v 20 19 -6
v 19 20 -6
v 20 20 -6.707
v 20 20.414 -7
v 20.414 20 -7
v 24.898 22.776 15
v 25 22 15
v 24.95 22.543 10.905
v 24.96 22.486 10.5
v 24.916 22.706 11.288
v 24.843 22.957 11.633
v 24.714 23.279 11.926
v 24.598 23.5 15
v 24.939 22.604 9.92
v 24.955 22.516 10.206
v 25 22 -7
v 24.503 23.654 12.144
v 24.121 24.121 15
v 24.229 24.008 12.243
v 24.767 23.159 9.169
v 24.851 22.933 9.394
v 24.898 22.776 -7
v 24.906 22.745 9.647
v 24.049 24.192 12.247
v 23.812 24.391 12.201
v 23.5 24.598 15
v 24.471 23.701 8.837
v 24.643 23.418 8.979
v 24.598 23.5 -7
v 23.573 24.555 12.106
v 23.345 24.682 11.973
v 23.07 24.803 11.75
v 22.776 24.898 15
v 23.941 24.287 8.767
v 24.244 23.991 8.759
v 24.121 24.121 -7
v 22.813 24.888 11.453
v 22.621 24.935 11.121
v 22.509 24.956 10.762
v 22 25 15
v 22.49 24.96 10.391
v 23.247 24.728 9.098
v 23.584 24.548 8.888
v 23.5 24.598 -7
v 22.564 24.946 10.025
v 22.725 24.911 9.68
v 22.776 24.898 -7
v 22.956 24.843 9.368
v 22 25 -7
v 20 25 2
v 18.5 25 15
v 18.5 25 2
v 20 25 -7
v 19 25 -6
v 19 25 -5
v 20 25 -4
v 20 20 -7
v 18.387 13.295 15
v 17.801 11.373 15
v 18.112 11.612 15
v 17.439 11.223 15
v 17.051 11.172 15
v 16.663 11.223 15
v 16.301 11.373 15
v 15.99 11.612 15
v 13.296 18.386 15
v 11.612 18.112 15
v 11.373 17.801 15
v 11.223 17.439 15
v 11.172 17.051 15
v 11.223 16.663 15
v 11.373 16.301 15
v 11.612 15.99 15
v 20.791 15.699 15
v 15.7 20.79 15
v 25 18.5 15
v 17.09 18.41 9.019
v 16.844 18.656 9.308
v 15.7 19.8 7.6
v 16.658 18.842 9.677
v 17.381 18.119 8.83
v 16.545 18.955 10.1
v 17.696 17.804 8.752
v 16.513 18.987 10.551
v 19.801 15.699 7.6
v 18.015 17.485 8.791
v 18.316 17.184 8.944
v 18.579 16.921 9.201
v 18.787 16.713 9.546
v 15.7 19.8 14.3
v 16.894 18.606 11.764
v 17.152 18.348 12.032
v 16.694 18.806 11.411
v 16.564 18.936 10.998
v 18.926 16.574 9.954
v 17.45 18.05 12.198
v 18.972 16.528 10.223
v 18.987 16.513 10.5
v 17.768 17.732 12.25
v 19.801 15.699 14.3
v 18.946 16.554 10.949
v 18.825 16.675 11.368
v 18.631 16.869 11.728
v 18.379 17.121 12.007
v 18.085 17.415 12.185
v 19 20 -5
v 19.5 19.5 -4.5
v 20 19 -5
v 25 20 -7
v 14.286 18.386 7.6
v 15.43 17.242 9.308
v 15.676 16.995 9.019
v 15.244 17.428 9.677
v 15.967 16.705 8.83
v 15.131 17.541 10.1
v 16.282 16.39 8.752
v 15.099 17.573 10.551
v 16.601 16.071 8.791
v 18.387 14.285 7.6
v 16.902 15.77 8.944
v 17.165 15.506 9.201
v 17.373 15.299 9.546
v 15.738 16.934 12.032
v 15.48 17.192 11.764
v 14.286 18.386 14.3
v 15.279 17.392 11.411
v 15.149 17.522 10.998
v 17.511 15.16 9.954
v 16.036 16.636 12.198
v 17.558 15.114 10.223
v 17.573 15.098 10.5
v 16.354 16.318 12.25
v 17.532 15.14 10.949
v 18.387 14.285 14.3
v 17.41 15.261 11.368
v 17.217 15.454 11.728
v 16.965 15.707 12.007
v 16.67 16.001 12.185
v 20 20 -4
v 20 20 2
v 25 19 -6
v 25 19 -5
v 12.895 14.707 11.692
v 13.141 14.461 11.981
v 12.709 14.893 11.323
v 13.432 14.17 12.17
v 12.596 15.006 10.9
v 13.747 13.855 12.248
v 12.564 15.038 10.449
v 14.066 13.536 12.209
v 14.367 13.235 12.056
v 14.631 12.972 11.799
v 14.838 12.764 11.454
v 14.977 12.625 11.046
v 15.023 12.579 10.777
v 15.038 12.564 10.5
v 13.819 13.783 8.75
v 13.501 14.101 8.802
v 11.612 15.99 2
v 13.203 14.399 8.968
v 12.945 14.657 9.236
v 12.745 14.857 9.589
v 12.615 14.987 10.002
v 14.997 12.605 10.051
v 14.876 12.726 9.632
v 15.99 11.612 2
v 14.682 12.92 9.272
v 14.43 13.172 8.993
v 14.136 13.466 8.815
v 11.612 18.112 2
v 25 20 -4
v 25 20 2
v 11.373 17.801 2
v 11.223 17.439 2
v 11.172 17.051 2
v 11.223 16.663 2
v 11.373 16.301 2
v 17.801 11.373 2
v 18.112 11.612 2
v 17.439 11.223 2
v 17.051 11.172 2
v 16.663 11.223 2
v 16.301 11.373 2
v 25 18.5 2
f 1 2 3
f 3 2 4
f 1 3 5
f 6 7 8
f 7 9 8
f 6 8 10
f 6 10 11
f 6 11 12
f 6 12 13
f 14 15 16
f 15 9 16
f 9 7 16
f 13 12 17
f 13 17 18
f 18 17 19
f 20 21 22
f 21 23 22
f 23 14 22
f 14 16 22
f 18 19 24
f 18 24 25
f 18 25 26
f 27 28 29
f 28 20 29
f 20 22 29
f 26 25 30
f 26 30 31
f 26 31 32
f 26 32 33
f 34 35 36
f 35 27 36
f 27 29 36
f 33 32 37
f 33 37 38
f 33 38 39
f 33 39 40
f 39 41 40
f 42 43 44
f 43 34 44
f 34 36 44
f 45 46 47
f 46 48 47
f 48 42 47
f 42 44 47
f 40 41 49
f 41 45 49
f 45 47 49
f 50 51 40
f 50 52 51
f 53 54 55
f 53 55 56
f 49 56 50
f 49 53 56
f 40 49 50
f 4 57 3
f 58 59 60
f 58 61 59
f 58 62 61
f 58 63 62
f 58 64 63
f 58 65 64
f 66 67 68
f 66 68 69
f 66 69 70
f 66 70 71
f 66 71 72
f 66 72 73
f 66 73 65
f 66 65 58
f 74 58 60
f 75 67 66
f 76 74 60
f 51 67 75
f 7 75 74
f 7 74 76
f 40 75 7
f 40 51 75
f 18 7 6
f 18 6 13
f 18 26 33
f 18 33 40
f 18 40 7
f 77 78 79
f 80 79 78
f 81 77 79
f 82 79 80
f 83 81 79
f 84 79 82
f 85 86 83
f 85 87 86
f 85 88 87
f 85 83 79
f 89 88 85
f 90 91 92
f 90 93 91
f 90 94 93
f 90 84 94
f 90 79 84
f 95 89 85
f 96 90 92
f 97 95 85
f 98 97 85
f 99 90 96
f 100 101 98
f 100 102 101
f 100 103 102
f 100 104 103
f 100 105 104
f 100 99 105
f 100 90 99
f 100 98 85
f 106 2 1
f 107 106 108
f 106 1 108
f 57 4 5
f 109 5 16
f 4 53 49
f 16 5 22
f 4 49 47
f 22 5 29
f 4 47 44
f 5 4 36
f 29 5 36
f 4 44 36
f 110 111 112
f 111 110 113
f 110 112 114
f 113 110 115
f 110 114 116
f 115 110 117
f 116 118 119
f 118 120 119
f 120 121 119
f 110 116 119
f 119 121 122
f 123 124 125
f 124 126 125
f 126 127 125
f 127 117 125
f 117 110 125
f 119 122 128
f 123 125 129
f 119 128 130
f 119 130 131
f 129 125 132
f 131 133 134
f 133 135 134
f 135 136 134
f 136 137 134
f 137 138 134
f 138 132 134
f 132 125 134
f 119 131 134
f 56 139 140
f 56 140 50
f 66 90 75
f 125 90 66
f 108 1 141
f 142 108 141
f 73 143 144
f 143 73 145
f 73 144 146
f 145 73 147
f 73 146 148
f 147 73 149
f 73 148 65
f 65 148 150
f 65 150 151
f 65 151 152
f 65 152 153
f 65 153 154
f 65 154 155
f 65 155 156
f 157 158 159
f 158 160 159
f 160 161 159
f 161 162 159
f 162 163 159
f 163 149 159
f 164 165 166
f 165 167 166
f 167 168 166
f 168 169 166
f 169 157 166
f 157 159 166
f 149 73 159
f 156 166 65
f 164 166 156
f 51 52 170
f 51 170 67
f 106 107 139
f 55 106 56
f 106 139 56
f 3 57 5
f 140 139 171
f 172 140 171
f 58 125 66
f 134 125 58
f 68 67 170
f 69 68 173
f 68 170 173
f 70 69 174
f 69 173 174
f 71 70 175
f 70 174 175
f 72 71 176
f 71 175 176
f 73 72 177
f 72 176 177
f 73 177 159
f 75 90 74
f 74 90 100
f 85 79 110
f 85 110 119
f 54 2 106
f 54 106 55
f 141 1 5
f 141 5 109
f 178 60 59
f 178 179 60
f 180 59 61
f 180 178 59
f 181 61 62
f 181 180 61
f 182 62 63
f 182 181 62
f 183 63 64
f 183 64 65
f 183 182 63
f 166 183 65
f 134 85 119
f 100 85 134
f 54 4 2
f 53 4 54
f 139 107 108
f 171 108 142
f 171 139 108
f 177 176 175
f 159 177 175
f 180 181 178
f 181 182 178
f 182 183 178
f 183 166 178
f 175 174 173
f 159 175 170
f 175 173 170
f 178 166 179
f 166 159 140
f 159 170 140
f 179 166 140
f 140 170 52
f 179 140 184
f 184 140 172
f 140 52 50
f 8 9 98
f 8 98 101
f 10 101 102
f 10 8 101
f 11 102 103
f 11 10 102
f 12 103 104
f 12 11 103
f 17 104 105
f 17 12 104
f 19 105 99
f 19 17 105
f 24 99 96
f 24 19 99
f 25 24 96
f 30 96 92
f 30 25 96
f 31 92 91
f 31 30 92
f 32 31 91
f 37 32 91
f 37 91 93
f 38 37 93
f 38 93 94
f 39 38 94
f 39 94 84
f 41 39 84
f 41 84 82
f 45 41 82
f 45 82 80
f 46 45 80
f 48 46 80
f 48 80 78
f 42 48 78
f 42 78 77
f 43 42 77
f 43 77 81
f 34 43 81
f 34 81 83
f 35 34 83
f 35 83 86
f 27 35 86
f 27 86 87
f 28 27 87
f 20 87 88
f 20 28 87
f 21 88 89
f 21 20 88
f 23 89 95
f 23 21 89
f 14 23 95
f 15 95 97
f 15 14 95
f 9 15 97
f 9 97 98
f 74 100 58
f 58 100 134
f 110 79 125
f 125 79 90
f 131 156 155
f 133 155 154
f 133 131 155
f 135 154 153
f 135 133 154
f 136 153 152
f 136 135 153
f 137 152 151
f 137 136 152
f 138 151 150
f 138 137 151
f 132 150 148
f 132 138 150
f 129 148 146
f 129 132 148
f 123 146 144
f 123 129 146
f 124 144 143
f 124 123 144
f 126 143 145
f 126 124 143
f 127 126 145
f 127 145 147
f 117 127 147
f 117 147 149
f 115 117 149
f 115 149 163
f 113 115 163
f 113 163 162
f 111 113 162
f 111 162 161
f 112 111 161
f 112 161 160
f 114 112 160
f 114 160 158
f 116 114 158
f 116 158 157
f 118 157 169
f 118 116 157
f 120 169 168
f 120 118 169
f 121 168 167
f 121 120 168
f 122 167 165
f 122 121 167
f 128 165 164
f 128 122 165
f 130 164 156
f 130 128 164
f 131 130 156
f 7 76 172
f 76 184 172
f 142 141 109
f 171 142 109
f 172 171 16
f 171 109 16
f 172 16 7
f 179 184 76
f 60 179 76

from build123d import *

# Parameters (mm, degrees)
BOX406004_W                 = 5.8
BOX406004_H                 = 14.8
BOX406004_DEPTH             = 2
BOX406004_ROLL_ANGLE        = 89.999938
BOX406004_PITCH_ANGLE       = -2.6e-05
BOX406004_PLACEMENT_ANGLE   = -45.000013
CYLINDER066_R               = 1.75
CYLINDER066_DEPTH           = 33
CYLINDER066_ROLL_ANGLE      = 90.000024
CYLINDER066_PITCH_ANGLE     = 1e-05
CYLINDER066_PLACEMENT_ANGLE = -45.000049
BOX404_W                    = 5
BOX404_H                    = 5
BOX404_DEPTH                = 14
BOX406007_W                 = 14
BOX406007_H                 = 10
BOX406007_DEPTH             = 14
BOX406007_PLACEMENT_ANGLE   = 45
BOX405_W                    = 15
BOX405_H                    = 15
BOX405_DEPTH                = 13
CHAMFER_SIZE                = 8.5
FILLET_R                    = 1.5
BOX406008009_W              = 6
BOX406008009_H              = 6
BOX406008009_DEPTH          = 3
CHAMFER029_SIZE             = 1
CHAMFER030_SIZE             = 1
CHAMFER033_SIZE             = 1
FILLET006_R                 = 3
CHAMFER034_SIZE             = 0.7


with BuildPart() as box406004:
    # Box406004 → Box406004 (new body)
    with BuildSketch(Plane.XY):
        with Locations((2.9, 7.4)):
            Rectangle(BOX406004_W, BOX406004_H)
    extrude(amount=BOX406004_DEPTH)


with BuildPart() as box406004_1:
    # Box406004 roll: moved
    add(box406004.part.rotate(Axis((0, 0, 0), (1, 0, 0)), BOX406004_ROLL_ANGLE))


with BuildPart() as box406004_2:
    # Box406004 pitch: moved
    add(box406004_1.part.rotate(Axis((0, 0, 0), (0, 1, 0)), BOX406004_PITCH_ANGLE))


with BuildPart() as box406004_3:
    # Box406004 placement: moved
    add(box406004_2.part.moved(Location((15.7, 19.8, 7.6))).rotate(Axis((15.7, 19.8, 7.6), (0, 0, 1)), BOX406004_PLACEMENT_ANGLE))


with BuildPart() as finger_cavity:
    # Cylinder066 → Cylinder066 (new body)
    with BuildSketch(Plane.XY):
        Circle(CYLINDER066_R)
    extrude(amount=CYLINDER066_DEPTH)


with BuildPart() as finger_cavity_1:
    # Cylinder066 roll: moved
    add(finger_cavity.part.rotate(Axis((0, 0, 0), (1, 0, 0)), CYLINDER066_ROLL_ANGLE))


with BuildPart() as finger_cavity_2:
    # Cylinder066 pitch: moved
    add(finger_cavity_1.part.rotate(Axis((0, 0, 0), (0, 1, 0)), CYLINDER066_PITCH_ANGLE))


with BuildPart() as finger_cavity_3:
    # Cylinder066 placement: moved
    add(finger_cavity_2.part.moved(Location((26.8701, 26.8701, 10.5))).rotate(Axis((26.8701, 26.8701, 10.5), (0, 0, 1)), CYLINDER066_PLACEMENT_ANGLE))

    # Fusion103077010: union Box406004
    add(box406004_3.part)


with BuildPart() as cube334:
    # Box404 → Box404 (new body)
    with BuildSketch(Plane(origin=(20, 20, -7), x_dir=(1, 0, 0), z_dir=(0, 0, 1))):
        with Locations((2.5, 2.5)):
            Rectangle(BOX404_W, BOX404_H)
    extrude(amount=BOX404_DEPTH)


with BuildPart() as cube338:
    # Box406007 → Box406007 (new body)
    with BuildSketch(Plane.XY):
        with Locations((7, 5)):
            Rectangle(BOX406007_W, BOX406007_H)
    extrude(amount=BOX406007_DEPTH)


with BuildPart() as cube338_1:
    # Box406007 placement: moved
    add(cube338.part.moved(Location((1.78, 11.68, 2))).rotate(Axis((1.78, 11.68, 2), (0, 0, -1)), BOX406007_PLACEMENT_ANGLE))


with BuildPart() as fillet_body:
    # Box405 → Box405 (new body)
    with BuildSketch(Plane(origin=(10, 10, 2), x_dir=(1, 0, 0), z_dir=(0, 0, 1))):
        with Locations((7.5, 7.5)):
            Rectangle(BOX405_W, BOX405_H)
    extrude(amount=BOX405_DEPTH)

    # Chamfer
    chamfer_edges = [fillet_body.edges().sort_by_distance(p)[0] for p in [
        (10, 25, 8.5),
        (25, 10, 8.5),
    ]]
    chamfer(chamfer_edges, length=CHAMFER_SIZE)

    # Cut173011017: cut Cube338
    add(cube338_1.part, mode=Mode.SUBTRACT)

    # Fillet
    fillet_edges = [fillet_body.edges().sort_by_distance(p)[0] for p in [
        (10.551068, 17.051068, 8.5),
        (17.051068, 10.551068, 8.5),
    ]]
    fillet(fillet_edges, radius=FILLET_R)


with BuildPart() as finger:
    # Box406008009 → Box406008009 (new body)
    with BuildSketch(Plane(origin=(19, 19, -7), x_dir=(1, 0, 0), z_dir=(0, 0, 1))):
        with Locations((3, 3)):
            Rectangle(BOX406008009_W, BOX406008009_H)
    extrude(amount=BOX406008009_DEPTH)

    # Chamfer029
    chamfer029_edges = [finger.edges().sort_by_distance(p)[0] for p in [
        (19, 22, -4),
        (22, 19, -4),
    ]]
    chamfer(chamfer029_edges, length=CHAMFER029_SIZE)

    # Chamfer030
    chamfer030_edges = [finger.edges().sort_by_distance(p)[0] for p in [
        (19, 19, -6),
    ]]
    chamfer(chamfer030_edges, length=CHAMFER030_SIZE)

    # Chamfer033
    chamfer033_edges = [finger.edges().sort_by_distance(p)[0] for p in [
        (19, 22.5, -7),
        (19.5, 19.5, -7),
        (22.5, 19, -7),
    ]]
    chamfer(chamfer033_edges, length=CHAMFER033_SIZE)

    # Fusion103077013004017007: union Cube334, Fillet body
    add(cube334.part)
    add(fillet_body.part)

    # Fillet006
    fillet006_edges = [finger.edges().sort_by_distance(p)[0] for p in [
        (25, 25, -5.5),
        (25, 25, -1),
        (25, 25, 4.5),
        (25, 25, 11),
    ]]
    fillet(fillet006_edges, radius=FILLET006_R)

    # Cut173011018: cut finger-cavity
    add(finger_cavity_3.part, mode=Mode.SUBTRACT)

    # Chamfer034
    chamfer034_edges = [finger.edges().sort_by_distance(p)[0] for p in [
        (16.336399, 16.335185, 15),
        (19.094115, 14.991681, 15),
        (17.750613, 17.749398, 15),
        (14.992896, 19.092901, 15),
    ]]
    chamfer(chamfer034_edges, length=CHAMFER034_SIZE)


solid = finger.part
